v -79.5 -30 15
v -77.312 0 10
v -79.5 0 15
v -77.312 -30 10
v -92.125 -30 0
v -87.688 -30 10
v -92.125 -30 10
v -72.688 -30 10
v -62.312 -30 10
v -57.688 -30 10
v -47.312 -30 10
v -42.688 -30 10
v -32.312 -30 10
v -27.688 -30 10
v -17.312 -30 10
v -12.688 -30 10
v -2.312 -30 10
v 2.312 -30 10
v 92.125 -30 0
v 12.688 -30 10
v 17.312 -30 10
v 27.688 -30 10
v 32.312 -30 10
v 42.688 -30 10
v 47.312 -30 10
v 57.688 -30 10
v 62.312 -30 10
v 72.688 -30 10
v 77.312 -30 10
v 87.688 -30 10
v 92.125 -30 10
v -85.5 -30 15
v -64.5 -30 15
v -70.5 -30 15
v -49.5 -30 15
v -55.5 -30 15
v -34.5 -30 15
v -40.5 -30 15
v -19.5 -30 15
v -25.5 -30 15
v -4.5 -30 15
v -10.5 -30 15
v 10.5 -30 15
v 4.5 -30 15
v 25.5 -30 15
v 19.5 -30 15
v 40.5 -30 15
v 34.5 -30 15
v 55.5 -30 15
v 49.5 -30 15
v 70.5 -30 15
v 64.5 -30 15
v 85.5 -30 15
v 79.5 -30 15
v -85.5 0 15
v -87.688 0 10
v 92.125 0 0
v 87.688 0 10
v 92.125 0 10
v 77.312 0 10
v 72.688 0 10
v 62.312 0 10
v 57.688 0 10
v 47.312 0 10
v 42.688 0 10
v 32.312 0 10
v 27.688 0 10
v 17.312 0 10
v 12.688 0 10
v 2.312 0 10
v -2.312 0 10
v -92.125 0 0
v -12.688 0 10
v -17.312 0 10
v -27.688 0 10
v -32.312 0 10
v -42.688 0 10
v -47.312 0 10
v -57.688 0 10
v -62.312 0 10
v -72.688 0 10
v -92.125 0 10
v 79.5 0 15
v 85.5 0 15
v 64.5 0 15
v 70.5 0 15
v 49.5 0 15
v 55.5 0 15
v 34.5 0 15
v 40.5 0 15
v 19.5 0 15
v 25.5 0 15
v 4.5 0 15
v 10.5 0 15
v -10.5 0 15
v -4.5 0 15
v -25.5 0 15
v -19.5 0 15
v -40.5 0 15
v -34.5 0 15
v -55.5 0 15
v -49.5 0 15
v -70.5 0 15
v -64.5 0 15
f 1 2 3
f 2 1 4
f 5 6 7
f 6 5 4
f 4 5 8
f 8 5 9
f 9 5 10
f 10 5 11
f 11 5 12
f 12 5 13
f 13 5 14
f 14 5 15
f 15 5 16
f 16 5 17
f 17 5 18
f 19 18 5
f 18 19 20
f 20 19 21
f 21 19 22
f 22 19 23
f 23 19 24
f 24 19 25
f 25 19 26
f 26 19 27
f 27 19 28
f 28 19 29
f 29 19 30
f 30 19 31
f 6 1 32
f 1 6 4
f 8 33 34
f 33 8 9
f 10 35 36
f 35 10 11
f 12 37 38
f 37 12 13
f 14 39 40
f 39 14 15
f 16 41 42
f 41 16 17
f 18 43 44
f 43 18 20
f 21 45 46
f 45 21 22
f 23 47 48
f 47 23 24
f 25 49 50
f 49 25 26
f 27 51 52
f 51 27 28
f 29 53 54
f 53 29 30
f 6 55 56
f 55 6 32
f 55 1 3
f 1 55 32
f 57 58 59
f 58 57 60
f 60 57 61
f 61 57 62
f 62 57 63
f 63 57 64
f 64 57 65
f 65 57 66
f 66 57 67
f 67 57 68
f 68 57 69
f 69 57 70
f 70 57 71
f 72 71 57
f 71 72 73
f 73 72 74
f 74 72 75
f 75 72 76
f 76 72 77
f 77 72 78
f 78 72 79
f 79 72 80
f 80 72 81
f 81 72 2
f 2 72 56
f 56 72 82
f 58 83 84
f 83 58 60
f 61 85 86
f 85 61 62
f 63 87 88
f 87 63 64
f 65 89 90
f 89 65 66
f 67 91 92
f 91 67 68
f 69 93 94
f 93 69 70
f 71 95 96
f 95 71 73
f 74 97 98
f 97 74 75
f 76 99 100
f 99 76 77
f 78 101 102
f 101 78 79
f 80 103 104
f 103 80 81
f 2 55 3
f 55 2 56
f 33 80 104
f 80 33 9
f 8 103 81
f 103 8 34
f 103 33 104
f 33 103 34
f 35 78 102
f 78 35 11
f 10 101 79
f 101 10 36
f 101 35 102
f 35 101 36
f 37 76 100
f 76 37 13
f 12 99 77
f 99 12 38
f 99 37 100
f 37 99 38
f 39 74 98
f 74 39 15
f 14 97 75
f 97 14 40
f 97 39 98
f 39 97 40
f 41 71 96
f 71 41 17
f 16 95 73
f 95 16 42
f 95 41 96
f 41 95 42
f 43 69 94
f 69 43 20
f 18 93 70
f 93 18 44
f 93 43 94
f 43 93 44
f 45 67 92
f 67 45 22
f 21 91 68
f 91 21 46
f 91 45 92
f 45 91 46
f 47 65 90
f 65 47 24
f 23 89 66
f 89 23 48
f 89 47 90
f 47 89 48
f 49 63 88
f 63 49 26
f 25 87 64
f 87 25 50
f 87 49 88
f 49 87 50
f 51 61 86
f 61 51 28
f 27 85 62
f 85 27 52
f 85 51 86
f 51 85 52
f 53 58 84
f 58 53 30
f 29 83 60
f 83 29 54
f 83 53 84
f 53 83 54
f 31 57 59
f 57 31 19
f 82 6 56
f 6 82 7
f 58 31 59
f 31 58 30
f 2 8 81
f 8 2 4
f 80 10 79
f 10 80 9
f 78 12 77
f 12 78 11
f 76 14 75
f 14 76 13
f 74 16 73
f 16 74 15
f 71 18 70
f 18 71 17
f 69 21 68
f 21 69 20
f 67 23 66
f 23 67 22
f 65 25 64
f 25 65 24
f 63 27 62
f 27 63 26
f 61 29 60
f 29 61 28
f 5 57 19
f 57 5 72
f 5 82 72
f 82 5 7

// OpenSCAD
$fn = 32;

// ----------------------------------------------------------------------
// Toothed rack, 12 teeth
// 15 mm pitch, 5 mm teeth
// ----------------------------------------------------------------------

// --- parameters (mm) ---
bar_w = 30;      // bar width (Y)
bar_h = 10;      // bar height (Z)
teeth = 12;      // number of teeth
pitch = 15;      // tooth pitch
tooth_h = 5;     // tooth height above the bar
root_w = 11.25;  // tooth width at the root
crest_w = 6;     // tooth width at the crest

// --- derived feature positions (mm) ---
span = (teeth - 1) * pitch;  // = 165   distance between the outer teeth
bar_l = span + root_w + 8;   // = 184.25   bar length: teeth plus 4 mm at each end
tooth_x = -span / 2;         // = -82.5   X of the first tooth
height = bar_h + tooth_h;    // = 15   overall height
feature_centers = [
  [tooth_x + 0 * pitch, -bar_w / 2],
  [tooth_x + 1 * pitch, -bar_w / 2],
  [tooth_x + 2 * pitch, -bar_w / 2],
  [tooth_x + 3 * pitch, -bar_w / 2],
  [tooth_x + 4 * pitch, -bar_w / 2],
  [tooth_x + 5 * pitch, -bar_w / 2],
  [tooth_x + 6 * pitch, -bar_w / 2],
  [tooth_x + 7 * pitch, -bar_w / 2],
  [tooth_x + 8 * pitch, -bar_w / 2],
  [tooth_x + 9 * pitch, -bar_w / 2],
  [tooth_x + 10 * pitch, -bar_w / 2],
  [tooth_x + 11 * pitch, -bar_w / 2]
];   // tooth centre line, drives the tooth loop

// bar with a rack of teeth, one extruded trapezoium per centre
module rack_tooth() {
  linear_extrude(height = bar_w)
    polygon(points = [
      [0, 0],
      [root_w, 0],
      [root_w / 2 + crest_w / 2, tooth_h + 1],
      [root_w / 2 - crest_w / 2, tooth_h + 1]
    ]);
}

union() {
  translate([-bar_l / 2, -bar_w, 0]) cube([bar_l, bar_w, bar_h]);
  for (centre = feature_centers)
    translate([centre[0] - root_w / 2, 0, bar_h - 1]) rotate([90, 0, 0]) rack_tooth();
}
